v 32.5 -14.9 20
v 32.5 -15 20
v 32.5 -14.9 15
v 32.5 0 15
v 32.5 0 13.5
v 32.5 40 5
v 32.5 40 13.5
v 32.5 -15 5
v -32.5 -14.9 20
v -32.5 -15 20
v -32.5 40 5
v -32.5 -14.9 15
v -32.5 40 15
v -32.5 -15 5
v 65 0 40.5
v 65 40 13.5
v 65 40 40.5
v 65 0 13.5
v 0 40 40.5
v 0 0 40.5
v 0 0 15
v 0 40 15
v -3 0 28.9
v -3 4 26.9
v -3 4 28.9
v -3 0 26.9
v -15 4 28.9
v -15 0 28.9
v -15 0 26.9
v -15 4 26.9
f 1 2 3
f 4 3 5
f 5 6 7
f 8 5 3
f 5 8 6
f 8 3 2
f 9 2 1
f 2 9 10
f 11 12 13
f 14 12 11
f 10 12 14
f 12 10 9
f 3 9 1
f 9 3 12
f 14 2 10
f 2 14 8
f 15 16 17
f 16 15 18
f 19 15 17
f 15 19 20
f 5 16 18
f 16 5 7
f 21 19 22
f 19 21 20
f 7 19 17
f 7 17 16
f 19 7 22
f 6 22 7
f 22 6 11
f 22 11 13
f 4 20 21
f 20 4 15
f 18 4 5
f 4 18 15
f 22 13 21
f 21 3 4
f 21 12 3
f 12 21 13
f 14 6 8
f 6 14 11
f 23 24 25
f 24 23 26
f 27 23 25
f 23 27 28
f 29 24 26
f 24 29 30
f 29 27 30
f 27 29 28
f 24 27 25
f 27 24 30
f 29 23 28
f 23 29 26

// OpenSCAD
// Sharp GP2Y0A21YK0F Sensor Housing Model
// Units: millimeters (mm)

$fn = 64; // Increased detail for curved edges/cylinders

// --- Dimensions Definition (based on the drawing) ---
// Main Body Block dimensions (Approximate outer shell)
MAIN_W = 65;   // X-axis width
MAIN_H = 27;   // Z-axis height (Lens protrusion included)
MAIN_L = 40;   // Y-axis length

// Connecting Bar dimensions
BAR_THICKNESS = 10; // Z-thickness of the connecting bar
BAR_LENGTH = MAIN_L + 15; // Extending past main block end for mounting points

// Lens/Window Dimensions (Simplified representation)
LENS_DEPTH = 2.0; // Depth of the lens recess feature on top
RECEIVING_WINDOW_W = 12;
RECEIVING_WINDOW_H = 4;
TRANSMITTING_WINDOW_D = 8;
TRANSMITTING_WINDOW_W = 6;

// Mounting Hole Dimensions
HOLE_DIAMETER = 3.0;
HOLE_Z_POS = -5; // Positioned near the end of the connecting bar

module sensor_housing() {
    union() {
        // 1. Main Body Housing (The primary rectangular block)
        translate([0, 0, MAIN_H/2]) {
            cube([MAIN_W, MAIN_L, MAIN_H]);
        }

        // 2. Connecting Bar Extension (Bottom extension)
        // Note: This bar extends the overall length and provides mounting points.
        translate([-MAIN_W/2, -15, BAR_THICKNESS/2]) {
            cube([MAIN_W, BAR_LENGTH, BAR_THICKNESS]);
        }

        // 3. LENS WINDOWS (Features on the top face)
        // These are modeled as recessed areas or visible windows in the upper surface.

        // Receiving Lens Window (Left side, Rectangular)
        translate([-15, 0, MAIN_H - 0.1]) { // Z slightly below top surface for recess effect
            cube([RECEIVING_WINDOW_W, RECEIVING_WINDOW_H, LENS_DEPTH]);
        }

        // Transmitting Lens Window (Right side, Rectangular/Circular slot)
        translate([5, 0, MAIN_H - 0.1]) { // Z slightly below top surface for recess effect
            cube([TRANSMITTING_WINDOW_W, TRANSMITTING_WINDOW_D, LENS_DEPTH]);
        }

        // 4. MOUNTING HOLES (Subtracted from the Connecting Bar)
        difference() {
            // Start with a copy of the connecting bar volume to ensure accurate subtraction location
            translate([-MAIN_W/2, -15, BAR_THICKNESS]) {
                cube([MAIN_W, 0.1, BAR_THICKNESS]); // Thin slice where holes are placed
            }

            // Hole 1 (Left)
            translate([-(MAIN_W/2) + 4, -10, 0]) {
                cylinder(h=BAR_THICKNESS * 2, r=HOLE_DIAMETER/2);
            }

            // Hole 2 (Right)
            translate([(MAIN_W/2) - 4, -10, 0]) {
                cylinder(h=BAR_THICKNESS * 2, r=HOLE_DIAMETER/2);
            }
        }
    }
}

// Final render call
sensor_housing();
